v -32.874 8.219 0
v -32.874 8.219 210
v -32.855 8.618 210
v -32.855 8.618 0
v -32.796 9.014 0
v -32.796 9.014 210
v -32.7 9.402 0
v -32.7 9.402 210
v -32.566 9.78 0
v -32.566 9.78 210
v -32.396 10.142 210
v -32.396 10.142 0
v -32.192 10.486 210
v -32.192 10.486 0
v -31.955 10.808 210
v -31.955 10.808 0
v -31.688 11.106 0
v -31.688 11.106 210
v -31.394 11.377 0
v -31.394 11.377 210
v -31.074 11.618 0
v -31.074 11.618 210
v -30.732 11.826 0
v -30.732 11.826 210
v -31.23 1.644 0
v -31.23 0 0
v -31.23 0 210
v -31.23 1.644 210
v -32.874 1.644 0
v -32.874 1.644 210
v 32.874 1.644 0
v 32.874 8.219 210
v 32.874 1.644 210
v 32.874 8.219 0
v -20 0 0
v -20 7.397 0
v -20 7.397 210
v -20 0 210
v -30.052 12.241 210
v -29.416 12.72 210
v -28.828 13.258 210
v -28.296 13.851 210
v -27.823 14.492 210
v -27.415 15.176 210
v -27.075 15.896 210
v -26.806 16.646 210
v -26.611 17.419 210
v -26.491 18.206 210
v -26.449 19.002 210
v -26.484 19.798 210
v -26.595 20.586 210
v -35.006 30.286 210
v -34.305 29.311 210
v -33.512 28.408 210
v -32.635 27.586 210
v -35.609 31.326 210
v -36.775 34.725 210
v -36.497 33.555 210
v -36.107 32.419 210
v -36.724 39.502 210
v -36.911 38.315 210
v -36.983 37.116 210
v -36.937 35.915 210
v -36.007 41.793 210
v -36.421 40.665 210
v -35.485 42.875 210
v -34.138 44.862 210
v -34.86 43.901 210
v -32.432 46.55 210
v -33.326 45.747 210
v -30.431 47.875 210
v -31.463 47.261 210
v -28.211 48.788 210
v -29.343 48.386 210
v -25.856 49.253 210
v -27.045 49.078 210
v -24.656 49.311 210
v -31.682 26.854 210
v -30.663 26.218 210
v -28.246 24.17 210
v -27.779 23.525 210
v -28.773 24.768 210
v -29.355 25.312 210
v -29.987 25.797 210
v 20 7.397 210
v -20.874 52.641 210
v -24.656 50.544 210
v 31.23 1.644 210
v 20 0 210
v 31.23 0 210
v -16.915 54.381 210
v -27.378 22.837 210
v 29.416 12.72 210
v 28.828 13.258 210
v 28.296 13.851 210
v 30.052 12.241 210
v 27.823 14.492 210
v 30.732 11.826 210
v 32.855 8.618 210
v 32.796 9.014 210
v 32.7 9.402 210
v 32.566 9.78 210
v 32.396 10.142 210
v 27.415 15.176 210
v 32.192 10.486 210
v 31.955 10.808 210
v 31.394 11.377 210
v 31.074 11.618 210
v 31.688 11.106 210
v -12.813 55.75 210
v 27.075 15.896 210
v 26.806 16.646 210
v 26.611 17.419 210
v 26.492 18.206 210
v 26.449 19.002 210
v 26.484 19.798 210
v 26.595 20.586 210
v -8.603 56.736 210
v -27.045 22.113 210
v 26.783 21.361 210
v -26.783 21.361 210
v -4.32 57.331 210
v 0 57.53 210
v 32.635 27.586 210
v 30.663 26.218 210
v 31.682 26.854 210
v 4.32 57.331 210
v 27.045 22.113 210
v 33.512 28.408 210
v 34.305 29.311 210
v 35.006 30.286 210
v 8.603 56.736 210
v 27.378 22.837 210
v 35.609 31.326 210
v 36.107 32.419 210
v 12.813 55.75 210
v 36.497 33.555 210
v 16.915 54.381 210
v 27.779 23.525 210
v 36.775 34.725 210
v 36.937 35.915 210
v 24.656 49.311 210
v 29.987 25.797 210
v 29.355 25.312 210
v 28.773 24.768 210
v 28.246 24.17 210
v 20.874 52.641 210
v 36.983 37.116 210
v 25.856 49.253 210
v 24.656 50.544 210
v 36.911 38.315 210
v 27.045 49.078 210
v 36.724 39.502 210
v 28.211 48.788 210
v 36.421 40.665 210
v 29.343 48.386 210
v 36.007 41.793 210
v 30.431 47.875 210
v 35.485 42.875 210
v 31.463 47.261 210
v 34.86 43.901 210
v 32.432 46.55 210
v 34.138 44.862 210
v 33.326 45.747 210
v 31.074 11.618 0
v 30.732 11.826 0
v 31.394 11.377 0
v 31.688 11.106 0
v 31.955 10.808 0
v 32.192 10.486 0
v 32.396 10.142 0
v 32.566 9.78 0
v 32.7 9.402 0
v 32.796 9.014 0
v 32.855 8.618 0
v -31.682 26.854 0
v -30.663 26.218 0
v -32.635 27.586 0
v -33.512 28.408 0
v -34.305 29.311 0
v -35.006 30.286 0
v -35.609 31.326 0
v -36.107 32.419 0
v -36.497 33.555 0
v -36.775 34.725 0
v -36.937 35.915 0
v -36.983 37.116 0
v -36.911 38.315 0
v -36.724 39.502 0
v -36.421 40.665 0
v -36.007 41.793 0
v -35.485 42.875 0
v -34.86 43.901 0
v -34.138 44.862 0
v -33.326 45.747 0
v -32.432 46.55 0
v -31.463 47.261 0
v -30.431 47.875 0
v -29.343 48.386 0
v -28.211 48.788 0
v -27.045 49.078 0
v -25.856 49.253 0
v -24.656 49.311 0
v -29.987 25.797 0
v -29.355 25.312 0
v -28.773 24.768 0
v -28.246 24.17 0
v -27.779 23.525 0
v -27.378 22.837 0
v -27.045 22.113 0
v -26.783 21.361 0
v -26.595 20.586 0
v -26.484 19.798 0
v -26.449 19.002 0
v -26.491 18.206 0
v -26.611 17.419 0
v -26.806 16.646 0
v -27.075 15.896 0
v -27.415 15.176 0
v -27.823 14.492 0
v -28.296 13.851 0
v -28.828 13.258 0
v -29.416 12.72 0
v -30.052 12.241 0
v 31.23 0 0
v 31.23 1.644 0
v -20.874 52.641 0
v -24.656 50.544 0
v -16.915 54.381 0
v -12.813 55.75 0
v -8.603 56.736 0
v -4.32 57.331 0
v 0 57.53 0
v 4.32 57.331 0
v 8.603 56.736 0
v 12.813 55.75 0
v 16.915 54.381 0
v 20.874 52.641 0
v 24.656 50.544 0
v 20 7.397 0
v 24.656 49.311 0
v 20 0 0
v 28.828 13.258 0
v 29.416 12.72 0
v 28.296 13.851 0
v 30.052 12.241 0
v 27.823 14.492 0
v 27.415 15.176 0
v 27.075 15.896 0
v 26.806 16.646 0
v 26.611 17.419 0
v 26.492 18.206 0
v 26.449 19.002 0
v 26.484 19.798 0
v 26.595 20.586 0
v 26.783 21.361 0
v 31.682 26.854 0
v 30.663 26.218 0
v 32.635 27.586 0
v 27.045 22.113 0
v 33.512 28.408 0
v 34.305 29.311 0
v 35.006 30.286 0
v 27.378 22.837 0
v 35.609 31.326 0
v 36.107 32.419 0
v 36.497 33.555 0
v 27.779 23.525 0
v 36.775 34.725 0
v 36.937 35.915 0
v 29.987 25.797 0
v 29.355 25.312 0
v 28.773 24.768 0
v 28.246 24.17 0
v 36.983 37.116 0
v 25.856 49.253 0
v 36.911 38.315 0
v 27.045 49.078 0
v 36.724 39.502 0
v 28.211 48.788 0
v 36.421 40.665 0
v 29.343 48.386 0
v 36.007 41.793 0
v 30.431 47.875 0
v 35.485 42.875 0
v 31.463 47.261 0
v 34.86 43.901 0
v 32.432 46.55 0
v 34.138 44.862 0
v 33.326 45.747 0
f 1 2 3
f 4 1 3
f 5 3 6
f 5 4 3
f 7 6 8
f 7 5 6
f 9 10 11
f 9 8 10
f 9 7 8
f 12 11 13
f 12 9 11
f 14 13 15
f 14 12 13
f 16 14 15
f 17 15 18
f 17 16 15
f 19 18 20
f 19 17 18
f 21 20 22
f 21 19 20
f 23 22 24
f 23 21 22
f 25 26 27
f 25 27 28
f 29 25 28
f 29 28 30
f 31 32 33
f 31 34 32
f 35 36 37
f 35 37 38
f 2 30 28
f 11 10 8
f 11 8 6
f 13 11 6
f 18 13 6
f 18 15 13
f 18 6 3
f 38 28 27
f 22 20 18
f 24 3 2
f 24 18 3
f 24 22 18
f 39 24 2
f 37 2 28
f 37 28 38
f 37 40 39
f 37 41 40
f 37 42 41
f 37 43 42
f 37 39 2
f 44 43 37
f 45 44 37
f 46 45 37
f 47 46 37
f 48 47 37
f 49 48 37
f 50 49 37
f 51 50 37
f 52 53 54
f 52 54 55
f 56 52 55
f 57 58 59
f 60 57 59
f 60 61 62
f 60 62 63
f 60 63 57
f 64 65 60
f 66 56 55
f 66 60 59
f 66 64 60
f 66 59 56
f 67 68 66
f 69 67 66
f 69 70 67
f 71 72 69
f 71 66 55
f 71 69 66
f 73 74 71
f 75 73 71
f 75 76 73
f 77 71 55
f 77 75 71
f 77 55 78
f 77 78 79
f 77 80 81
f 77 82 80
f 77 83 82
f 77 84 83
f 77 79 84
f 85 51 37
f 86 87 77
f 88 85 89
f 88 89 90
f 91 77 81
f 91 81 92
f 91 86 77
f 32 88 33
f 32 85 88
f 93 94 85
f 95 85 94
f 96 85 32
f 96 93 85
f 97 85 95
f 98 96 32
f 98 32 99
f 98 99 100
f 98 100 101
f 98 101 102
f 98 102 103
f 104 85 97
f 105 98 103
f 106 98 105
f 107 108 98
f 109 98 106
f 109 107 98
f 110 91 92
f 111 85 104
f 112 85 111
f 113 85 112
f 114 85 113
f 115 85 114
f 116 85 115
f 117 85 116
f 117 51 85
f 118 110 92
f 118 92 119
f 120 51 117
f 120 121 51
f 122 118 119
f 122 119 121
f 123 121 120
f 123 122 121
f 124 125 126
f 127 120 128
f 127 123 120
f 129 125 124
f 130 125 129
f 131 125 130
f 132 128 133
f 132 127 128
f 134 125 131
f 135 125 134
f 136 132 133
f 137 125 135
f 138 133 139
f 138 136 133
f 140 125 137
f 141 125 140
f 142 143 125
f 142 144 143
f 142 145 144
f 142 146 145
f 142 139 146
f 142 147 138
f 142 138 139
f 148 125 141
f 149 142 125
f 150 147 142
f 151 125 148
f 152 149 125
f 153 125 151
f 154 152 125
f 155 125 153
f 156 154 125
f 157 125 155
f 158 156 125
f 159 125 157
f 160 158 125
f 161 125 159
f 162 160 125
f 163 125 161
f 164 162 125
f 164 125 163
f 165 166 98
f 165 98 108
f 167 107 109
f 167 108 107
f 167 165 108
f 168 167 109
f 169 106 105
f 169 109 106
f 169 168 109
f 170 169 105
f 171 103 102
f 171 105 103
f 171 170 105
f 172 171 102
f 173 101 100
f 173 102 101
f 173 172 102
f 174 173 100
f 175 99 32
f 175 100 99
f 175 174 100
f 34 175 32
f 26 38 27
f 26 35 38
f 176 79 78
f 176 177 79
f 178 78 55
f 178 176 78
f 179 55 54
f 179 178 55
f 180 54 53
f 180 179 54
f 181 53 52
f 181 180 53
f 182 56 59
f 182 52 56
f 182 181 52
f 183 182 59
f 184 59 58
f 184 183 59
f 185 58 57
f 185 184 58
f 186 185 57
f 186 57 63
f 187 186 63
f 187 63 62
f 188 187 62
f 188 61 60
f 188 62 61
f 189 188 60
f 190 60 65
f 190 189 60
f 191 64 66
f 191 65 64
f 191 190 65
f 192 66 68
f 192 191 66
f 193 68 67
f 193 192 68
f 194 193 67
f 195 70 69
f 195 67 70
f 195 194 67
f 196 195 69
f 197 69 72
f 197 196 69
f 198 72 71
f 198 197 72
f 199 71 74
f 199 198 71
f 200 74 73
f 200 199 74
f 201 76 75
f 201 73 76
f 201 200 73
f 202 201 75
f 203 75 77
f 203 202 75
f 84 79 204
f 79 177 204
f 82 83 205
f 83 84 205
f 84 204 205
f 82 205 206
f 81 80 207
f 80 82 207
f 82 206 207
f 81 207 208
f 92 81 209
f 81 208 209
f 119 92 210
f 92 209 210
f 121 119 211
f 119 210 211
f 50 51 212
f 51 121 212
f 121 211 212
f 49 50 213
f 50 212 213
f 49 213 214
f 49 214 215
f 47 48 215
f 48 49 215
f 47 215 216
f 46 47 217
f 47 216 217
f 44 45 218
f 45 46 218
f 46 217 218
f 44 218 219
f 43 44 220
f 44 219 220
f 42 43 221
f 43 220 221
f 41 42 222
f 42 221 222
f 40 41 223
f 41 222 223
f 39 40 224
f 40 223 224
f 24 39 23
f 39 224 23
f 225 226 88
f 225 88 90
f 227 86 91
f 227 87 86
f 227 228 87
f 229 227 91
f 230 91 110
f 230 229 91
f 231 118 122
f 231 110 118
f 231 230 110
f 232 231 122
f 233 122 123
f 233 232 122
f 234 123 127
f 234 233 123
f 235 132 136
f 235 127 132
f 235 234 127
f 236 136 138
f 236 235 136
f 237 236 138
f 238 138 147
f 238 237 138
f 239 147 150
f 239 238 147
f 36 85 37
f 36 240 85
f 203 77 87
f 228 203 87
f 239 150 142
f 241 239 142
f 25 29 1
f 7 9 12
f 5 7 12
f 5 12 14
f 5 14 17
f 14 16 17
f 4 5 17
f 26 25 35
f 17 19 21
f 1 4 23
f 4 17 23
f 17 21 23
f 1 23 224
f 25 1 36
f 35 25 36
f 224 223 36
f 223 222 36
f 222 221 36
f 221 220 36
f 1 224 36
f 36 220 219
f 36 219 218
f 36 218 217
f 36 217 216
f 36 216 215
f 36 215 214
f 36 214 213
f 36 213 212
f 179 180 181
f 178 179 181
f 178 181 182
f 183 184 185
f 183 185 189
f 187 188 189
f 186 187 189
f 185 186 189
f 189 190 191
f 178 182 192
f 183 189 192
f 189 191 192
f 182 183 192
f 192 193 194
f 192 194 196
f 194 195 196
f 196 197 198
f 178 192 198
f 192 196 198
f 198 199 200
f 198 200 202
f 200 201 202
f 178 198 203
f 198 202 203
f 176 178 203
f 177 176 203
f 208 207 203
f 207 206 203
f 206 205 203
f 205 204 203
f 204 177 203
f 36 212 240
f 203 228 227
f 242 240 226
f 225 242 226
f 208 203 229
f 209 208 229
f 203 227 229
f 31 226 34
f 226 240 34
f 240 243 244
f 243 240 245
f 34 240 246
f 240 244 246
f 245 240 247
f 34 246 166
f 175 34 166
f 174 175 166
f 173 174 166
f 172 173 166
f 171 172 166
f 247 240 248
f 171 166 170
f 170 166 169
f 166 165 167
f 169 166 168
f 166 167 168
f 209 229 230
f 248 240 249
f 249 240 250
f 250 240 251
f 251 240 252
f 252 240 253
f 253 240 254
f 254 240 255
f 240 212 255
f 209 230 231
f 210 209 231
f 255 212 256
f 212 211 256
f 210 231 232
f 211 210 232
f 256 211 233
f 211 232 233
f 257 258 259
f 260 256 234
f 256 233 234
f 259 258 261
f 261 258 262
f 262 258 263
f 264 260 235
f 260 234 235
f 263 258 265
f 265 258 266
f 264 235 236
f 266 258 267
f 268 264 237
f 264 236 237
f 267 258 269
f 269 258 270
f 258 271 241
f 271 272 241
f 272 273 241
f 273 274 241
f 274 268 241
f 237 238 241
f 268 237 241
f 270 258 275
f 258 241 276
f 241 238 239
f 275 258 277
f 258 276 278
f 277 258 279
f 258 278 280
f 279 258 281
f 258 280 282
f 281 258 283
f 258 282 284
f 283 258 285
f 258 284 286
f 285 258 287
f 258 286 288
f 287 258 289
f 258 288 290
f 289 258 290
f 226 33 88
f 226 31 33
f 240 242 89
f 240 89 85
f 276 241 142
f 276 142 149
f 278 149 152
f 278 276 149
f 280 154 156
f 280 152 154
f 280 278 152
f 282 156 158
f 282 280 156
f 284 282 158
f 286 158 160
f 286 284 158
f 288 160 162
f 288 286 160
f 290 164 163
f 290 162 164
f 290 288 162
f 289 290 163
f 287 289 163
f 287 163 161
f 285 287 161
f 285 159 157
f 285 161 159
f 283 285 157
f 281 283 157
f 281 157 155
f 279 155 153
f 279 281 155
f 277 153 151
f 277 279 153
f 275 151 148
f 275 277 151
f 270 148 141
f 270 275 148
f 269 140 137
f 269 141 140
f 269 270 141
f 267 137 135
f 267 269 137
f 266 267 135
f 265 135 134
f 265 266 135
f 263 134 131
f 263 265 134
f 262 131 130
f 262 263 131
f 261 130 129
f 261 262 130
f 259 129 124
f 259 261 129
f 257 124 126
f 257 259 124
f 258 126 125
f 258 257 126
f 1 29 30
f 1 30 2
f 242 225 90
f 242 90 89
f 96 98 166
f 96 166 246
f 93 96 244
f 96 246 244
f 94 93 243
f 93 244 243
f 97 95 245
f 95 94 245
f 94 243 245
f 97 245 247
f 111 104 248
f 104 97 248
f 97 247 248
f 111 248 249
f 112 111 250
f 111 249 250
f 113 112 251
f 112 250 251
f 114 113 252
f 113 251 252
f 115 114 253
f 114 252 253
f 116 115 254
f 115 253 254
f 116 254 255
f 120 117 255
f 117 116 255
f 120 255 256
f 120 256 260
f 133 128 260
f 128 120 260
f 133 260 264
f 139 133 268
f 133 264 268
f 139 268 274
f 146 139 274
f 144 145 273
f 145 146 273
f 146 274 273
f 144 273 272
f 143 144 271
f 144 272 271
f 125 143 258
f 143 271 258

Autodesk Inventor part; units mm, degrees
ref_plane "YZ Plane" through (0, 0, 0) normal (1, 0, 0) x (0, 1, 0)
ref_plane "XZ Plane" through (0, 0, 0) normal (0, 1, 0) x (-1, 0, 0)
sketch "Поручень" plane through (0, 0, 0) normal (0, 0, 1) x (1, 0, 0)
  line L0 (20.3655, -7.6059) -> (20.3655, -0.2092)
  line L1 (20.3655, -0.2092) -> (-19.6345, -0.2092)
  line L2 (-19.6345, -0.2092) -> (-19.6345, -7.6059)
  line L3 (-19.6345, -7.6059) -> (-30.865, -7.6059)
  line L4 (-30.865, -7.6059) -> (-30.865, -5.9622)
  line L5 (-30.865, -5.9622) -> (-32.5087, -5.9622)
  line L6 (-32.5087, -5.9622) -> (-32.5087, 0.6126)
  arc A0 (-30.367, 4.2203) -> (-32.5087, 0.6126) centre (-28.3995, 0.6126) ccw
  arc A1 (-30.367, 4.2203) -> (-30.2973, 18.6123) centre (-34.302, 11.4355) ccw
  arc A2 (-24.2902, 41.7054) -> (-30.2973, 18.6123) centre (-24.2902, 29.3776) ccw
  line L7 (-24.2902, 41.7054) -> (-24.2902, 42.9382)
  arc A3 (25.0211, 42.9382) -> (-24.2902, 42.9382) centre (0.3655, 2.9211) ccw
  line L8 (25.0211, 42.9382) -> (25.0211, 41.7054)
  arc A4 (31.0282, 18.6123) -> (25.0211, 41.7054) centre (25.0211, 29.3776) ccw
  arc A5 (31.0282, 18.6123) -> (31.0979, 4.2203) centre (35.033, 11.4355) ccw
  arc A6 (33.2397, 0.6126) -> (31.0979, 4.2203) centre (29.1304, 0.6126) ccw
  line L9 (33.2397, 0.6126) -> (33.2397, -5.9622)
  line L10 (33.2397, -5.9622) -> (31.596, -5.9622)
  line L11 (31.596, -5.9622) -> (31.596, -7.6059)
  line L12 (31.596, -7.6059) -> (20.3655, -7.6059)
  point P0 (0.3655, -0.2092)
  point P1 (0.3655, -7.6059)
sketch "Эскиз" plane through (0, 0, 0) normal (0, 0, 1) x (1, 0, 0)
  line L0 (20, 0) -> (20, 7.3967)
  line L1 (20, 7.3967) -> (-20, 7.3967)
  line L2 (-20, 7.3967) -> (-20, 0)
  line L3 (-20, 0) -> (-31.2305, 0)
  line L4 (-31.2305, 0) -> (-31.2305, 1.6437)
  line L5 (-31.2305, 1.6437) -> (-32.8742, 1.6437)
  line L6 (-32.8742, 1.6437) -> (-32.8742, 8.2186)
  arc A0 (-30.7325, 11.8262) -> (-32.8742, 8.2186) centre (-28.7649, 8.2186) ccw
  arc A1 (-30.7325, 11.8262) -> (-30.6628, 26.2183) centre (-34.6675, 19.0415) ccw
  arc A2 (-24.6557, 49.3113) -> (-30.6628, 26.2183) centre (-24.6557, 36.9835) ccw
  line L7 (-24.6557, 49.3113) -> (-24.6557, 50.5441)
  arc A3 (24.6557, 50.5441) -> (-24.6557, 50.5441) centre (0, 10.527) ccw
  line L8 (24.6557, 50.5441) -> (24.6557, 49.3113)
  arc A4 (30.6628, 26.2183) -> (24.6557, 49.3113) centre (24.6557, 36.9835) ccw
  arc A5 (30.6628, 26.2183) -> (30.7325, 11.8262) centre (34.6675, 19.0415) ccw
  arc A6 (32.8742, 8.2186) -> (30.7325, 11.8262) centre (28.7649, 8.2186) ccw
  line L9 (32.8742, 8.2186) -> (32.8742, 1.6437)
  line L10 (32.8742, 1.6437) -> (31.2305, 1.6437)
  line L11 (31.2305, 1.6437) -> (31.2305, 0)
  line L12 (31.2305, 0) -> (20, 0)
  point P0 (0, 0)
ref_plane "Начальная плоскость" through (0, 0, 0) normal (0, 0, 1) x (1, 0, 0)
ref_plane "РабПлоскость2" through (0, 0, 210) normal (0, 0, 1) x (1, 0, 0)
extrude "Тело" add sketch "Эскиз" along normal up to surface (210 mm away) from surface at 0
ref_plane "Конечная плоскость" through (0, 0, 210) normal (0, 0, 1) x (1, 0, 0)
equation "\"ШИРИНА\" = 75"
equation "\"ТОЛЩВЫС\" = 58"
equation "\"СЕЧЕНИЕ_СМЕЩ\" = 0"
equation "\"G_OFFSET_END\" = 0"
equation "\"G_OFFSET_START\" = 0"
properties part number "Поручень" material "Древесина (дуб)"
